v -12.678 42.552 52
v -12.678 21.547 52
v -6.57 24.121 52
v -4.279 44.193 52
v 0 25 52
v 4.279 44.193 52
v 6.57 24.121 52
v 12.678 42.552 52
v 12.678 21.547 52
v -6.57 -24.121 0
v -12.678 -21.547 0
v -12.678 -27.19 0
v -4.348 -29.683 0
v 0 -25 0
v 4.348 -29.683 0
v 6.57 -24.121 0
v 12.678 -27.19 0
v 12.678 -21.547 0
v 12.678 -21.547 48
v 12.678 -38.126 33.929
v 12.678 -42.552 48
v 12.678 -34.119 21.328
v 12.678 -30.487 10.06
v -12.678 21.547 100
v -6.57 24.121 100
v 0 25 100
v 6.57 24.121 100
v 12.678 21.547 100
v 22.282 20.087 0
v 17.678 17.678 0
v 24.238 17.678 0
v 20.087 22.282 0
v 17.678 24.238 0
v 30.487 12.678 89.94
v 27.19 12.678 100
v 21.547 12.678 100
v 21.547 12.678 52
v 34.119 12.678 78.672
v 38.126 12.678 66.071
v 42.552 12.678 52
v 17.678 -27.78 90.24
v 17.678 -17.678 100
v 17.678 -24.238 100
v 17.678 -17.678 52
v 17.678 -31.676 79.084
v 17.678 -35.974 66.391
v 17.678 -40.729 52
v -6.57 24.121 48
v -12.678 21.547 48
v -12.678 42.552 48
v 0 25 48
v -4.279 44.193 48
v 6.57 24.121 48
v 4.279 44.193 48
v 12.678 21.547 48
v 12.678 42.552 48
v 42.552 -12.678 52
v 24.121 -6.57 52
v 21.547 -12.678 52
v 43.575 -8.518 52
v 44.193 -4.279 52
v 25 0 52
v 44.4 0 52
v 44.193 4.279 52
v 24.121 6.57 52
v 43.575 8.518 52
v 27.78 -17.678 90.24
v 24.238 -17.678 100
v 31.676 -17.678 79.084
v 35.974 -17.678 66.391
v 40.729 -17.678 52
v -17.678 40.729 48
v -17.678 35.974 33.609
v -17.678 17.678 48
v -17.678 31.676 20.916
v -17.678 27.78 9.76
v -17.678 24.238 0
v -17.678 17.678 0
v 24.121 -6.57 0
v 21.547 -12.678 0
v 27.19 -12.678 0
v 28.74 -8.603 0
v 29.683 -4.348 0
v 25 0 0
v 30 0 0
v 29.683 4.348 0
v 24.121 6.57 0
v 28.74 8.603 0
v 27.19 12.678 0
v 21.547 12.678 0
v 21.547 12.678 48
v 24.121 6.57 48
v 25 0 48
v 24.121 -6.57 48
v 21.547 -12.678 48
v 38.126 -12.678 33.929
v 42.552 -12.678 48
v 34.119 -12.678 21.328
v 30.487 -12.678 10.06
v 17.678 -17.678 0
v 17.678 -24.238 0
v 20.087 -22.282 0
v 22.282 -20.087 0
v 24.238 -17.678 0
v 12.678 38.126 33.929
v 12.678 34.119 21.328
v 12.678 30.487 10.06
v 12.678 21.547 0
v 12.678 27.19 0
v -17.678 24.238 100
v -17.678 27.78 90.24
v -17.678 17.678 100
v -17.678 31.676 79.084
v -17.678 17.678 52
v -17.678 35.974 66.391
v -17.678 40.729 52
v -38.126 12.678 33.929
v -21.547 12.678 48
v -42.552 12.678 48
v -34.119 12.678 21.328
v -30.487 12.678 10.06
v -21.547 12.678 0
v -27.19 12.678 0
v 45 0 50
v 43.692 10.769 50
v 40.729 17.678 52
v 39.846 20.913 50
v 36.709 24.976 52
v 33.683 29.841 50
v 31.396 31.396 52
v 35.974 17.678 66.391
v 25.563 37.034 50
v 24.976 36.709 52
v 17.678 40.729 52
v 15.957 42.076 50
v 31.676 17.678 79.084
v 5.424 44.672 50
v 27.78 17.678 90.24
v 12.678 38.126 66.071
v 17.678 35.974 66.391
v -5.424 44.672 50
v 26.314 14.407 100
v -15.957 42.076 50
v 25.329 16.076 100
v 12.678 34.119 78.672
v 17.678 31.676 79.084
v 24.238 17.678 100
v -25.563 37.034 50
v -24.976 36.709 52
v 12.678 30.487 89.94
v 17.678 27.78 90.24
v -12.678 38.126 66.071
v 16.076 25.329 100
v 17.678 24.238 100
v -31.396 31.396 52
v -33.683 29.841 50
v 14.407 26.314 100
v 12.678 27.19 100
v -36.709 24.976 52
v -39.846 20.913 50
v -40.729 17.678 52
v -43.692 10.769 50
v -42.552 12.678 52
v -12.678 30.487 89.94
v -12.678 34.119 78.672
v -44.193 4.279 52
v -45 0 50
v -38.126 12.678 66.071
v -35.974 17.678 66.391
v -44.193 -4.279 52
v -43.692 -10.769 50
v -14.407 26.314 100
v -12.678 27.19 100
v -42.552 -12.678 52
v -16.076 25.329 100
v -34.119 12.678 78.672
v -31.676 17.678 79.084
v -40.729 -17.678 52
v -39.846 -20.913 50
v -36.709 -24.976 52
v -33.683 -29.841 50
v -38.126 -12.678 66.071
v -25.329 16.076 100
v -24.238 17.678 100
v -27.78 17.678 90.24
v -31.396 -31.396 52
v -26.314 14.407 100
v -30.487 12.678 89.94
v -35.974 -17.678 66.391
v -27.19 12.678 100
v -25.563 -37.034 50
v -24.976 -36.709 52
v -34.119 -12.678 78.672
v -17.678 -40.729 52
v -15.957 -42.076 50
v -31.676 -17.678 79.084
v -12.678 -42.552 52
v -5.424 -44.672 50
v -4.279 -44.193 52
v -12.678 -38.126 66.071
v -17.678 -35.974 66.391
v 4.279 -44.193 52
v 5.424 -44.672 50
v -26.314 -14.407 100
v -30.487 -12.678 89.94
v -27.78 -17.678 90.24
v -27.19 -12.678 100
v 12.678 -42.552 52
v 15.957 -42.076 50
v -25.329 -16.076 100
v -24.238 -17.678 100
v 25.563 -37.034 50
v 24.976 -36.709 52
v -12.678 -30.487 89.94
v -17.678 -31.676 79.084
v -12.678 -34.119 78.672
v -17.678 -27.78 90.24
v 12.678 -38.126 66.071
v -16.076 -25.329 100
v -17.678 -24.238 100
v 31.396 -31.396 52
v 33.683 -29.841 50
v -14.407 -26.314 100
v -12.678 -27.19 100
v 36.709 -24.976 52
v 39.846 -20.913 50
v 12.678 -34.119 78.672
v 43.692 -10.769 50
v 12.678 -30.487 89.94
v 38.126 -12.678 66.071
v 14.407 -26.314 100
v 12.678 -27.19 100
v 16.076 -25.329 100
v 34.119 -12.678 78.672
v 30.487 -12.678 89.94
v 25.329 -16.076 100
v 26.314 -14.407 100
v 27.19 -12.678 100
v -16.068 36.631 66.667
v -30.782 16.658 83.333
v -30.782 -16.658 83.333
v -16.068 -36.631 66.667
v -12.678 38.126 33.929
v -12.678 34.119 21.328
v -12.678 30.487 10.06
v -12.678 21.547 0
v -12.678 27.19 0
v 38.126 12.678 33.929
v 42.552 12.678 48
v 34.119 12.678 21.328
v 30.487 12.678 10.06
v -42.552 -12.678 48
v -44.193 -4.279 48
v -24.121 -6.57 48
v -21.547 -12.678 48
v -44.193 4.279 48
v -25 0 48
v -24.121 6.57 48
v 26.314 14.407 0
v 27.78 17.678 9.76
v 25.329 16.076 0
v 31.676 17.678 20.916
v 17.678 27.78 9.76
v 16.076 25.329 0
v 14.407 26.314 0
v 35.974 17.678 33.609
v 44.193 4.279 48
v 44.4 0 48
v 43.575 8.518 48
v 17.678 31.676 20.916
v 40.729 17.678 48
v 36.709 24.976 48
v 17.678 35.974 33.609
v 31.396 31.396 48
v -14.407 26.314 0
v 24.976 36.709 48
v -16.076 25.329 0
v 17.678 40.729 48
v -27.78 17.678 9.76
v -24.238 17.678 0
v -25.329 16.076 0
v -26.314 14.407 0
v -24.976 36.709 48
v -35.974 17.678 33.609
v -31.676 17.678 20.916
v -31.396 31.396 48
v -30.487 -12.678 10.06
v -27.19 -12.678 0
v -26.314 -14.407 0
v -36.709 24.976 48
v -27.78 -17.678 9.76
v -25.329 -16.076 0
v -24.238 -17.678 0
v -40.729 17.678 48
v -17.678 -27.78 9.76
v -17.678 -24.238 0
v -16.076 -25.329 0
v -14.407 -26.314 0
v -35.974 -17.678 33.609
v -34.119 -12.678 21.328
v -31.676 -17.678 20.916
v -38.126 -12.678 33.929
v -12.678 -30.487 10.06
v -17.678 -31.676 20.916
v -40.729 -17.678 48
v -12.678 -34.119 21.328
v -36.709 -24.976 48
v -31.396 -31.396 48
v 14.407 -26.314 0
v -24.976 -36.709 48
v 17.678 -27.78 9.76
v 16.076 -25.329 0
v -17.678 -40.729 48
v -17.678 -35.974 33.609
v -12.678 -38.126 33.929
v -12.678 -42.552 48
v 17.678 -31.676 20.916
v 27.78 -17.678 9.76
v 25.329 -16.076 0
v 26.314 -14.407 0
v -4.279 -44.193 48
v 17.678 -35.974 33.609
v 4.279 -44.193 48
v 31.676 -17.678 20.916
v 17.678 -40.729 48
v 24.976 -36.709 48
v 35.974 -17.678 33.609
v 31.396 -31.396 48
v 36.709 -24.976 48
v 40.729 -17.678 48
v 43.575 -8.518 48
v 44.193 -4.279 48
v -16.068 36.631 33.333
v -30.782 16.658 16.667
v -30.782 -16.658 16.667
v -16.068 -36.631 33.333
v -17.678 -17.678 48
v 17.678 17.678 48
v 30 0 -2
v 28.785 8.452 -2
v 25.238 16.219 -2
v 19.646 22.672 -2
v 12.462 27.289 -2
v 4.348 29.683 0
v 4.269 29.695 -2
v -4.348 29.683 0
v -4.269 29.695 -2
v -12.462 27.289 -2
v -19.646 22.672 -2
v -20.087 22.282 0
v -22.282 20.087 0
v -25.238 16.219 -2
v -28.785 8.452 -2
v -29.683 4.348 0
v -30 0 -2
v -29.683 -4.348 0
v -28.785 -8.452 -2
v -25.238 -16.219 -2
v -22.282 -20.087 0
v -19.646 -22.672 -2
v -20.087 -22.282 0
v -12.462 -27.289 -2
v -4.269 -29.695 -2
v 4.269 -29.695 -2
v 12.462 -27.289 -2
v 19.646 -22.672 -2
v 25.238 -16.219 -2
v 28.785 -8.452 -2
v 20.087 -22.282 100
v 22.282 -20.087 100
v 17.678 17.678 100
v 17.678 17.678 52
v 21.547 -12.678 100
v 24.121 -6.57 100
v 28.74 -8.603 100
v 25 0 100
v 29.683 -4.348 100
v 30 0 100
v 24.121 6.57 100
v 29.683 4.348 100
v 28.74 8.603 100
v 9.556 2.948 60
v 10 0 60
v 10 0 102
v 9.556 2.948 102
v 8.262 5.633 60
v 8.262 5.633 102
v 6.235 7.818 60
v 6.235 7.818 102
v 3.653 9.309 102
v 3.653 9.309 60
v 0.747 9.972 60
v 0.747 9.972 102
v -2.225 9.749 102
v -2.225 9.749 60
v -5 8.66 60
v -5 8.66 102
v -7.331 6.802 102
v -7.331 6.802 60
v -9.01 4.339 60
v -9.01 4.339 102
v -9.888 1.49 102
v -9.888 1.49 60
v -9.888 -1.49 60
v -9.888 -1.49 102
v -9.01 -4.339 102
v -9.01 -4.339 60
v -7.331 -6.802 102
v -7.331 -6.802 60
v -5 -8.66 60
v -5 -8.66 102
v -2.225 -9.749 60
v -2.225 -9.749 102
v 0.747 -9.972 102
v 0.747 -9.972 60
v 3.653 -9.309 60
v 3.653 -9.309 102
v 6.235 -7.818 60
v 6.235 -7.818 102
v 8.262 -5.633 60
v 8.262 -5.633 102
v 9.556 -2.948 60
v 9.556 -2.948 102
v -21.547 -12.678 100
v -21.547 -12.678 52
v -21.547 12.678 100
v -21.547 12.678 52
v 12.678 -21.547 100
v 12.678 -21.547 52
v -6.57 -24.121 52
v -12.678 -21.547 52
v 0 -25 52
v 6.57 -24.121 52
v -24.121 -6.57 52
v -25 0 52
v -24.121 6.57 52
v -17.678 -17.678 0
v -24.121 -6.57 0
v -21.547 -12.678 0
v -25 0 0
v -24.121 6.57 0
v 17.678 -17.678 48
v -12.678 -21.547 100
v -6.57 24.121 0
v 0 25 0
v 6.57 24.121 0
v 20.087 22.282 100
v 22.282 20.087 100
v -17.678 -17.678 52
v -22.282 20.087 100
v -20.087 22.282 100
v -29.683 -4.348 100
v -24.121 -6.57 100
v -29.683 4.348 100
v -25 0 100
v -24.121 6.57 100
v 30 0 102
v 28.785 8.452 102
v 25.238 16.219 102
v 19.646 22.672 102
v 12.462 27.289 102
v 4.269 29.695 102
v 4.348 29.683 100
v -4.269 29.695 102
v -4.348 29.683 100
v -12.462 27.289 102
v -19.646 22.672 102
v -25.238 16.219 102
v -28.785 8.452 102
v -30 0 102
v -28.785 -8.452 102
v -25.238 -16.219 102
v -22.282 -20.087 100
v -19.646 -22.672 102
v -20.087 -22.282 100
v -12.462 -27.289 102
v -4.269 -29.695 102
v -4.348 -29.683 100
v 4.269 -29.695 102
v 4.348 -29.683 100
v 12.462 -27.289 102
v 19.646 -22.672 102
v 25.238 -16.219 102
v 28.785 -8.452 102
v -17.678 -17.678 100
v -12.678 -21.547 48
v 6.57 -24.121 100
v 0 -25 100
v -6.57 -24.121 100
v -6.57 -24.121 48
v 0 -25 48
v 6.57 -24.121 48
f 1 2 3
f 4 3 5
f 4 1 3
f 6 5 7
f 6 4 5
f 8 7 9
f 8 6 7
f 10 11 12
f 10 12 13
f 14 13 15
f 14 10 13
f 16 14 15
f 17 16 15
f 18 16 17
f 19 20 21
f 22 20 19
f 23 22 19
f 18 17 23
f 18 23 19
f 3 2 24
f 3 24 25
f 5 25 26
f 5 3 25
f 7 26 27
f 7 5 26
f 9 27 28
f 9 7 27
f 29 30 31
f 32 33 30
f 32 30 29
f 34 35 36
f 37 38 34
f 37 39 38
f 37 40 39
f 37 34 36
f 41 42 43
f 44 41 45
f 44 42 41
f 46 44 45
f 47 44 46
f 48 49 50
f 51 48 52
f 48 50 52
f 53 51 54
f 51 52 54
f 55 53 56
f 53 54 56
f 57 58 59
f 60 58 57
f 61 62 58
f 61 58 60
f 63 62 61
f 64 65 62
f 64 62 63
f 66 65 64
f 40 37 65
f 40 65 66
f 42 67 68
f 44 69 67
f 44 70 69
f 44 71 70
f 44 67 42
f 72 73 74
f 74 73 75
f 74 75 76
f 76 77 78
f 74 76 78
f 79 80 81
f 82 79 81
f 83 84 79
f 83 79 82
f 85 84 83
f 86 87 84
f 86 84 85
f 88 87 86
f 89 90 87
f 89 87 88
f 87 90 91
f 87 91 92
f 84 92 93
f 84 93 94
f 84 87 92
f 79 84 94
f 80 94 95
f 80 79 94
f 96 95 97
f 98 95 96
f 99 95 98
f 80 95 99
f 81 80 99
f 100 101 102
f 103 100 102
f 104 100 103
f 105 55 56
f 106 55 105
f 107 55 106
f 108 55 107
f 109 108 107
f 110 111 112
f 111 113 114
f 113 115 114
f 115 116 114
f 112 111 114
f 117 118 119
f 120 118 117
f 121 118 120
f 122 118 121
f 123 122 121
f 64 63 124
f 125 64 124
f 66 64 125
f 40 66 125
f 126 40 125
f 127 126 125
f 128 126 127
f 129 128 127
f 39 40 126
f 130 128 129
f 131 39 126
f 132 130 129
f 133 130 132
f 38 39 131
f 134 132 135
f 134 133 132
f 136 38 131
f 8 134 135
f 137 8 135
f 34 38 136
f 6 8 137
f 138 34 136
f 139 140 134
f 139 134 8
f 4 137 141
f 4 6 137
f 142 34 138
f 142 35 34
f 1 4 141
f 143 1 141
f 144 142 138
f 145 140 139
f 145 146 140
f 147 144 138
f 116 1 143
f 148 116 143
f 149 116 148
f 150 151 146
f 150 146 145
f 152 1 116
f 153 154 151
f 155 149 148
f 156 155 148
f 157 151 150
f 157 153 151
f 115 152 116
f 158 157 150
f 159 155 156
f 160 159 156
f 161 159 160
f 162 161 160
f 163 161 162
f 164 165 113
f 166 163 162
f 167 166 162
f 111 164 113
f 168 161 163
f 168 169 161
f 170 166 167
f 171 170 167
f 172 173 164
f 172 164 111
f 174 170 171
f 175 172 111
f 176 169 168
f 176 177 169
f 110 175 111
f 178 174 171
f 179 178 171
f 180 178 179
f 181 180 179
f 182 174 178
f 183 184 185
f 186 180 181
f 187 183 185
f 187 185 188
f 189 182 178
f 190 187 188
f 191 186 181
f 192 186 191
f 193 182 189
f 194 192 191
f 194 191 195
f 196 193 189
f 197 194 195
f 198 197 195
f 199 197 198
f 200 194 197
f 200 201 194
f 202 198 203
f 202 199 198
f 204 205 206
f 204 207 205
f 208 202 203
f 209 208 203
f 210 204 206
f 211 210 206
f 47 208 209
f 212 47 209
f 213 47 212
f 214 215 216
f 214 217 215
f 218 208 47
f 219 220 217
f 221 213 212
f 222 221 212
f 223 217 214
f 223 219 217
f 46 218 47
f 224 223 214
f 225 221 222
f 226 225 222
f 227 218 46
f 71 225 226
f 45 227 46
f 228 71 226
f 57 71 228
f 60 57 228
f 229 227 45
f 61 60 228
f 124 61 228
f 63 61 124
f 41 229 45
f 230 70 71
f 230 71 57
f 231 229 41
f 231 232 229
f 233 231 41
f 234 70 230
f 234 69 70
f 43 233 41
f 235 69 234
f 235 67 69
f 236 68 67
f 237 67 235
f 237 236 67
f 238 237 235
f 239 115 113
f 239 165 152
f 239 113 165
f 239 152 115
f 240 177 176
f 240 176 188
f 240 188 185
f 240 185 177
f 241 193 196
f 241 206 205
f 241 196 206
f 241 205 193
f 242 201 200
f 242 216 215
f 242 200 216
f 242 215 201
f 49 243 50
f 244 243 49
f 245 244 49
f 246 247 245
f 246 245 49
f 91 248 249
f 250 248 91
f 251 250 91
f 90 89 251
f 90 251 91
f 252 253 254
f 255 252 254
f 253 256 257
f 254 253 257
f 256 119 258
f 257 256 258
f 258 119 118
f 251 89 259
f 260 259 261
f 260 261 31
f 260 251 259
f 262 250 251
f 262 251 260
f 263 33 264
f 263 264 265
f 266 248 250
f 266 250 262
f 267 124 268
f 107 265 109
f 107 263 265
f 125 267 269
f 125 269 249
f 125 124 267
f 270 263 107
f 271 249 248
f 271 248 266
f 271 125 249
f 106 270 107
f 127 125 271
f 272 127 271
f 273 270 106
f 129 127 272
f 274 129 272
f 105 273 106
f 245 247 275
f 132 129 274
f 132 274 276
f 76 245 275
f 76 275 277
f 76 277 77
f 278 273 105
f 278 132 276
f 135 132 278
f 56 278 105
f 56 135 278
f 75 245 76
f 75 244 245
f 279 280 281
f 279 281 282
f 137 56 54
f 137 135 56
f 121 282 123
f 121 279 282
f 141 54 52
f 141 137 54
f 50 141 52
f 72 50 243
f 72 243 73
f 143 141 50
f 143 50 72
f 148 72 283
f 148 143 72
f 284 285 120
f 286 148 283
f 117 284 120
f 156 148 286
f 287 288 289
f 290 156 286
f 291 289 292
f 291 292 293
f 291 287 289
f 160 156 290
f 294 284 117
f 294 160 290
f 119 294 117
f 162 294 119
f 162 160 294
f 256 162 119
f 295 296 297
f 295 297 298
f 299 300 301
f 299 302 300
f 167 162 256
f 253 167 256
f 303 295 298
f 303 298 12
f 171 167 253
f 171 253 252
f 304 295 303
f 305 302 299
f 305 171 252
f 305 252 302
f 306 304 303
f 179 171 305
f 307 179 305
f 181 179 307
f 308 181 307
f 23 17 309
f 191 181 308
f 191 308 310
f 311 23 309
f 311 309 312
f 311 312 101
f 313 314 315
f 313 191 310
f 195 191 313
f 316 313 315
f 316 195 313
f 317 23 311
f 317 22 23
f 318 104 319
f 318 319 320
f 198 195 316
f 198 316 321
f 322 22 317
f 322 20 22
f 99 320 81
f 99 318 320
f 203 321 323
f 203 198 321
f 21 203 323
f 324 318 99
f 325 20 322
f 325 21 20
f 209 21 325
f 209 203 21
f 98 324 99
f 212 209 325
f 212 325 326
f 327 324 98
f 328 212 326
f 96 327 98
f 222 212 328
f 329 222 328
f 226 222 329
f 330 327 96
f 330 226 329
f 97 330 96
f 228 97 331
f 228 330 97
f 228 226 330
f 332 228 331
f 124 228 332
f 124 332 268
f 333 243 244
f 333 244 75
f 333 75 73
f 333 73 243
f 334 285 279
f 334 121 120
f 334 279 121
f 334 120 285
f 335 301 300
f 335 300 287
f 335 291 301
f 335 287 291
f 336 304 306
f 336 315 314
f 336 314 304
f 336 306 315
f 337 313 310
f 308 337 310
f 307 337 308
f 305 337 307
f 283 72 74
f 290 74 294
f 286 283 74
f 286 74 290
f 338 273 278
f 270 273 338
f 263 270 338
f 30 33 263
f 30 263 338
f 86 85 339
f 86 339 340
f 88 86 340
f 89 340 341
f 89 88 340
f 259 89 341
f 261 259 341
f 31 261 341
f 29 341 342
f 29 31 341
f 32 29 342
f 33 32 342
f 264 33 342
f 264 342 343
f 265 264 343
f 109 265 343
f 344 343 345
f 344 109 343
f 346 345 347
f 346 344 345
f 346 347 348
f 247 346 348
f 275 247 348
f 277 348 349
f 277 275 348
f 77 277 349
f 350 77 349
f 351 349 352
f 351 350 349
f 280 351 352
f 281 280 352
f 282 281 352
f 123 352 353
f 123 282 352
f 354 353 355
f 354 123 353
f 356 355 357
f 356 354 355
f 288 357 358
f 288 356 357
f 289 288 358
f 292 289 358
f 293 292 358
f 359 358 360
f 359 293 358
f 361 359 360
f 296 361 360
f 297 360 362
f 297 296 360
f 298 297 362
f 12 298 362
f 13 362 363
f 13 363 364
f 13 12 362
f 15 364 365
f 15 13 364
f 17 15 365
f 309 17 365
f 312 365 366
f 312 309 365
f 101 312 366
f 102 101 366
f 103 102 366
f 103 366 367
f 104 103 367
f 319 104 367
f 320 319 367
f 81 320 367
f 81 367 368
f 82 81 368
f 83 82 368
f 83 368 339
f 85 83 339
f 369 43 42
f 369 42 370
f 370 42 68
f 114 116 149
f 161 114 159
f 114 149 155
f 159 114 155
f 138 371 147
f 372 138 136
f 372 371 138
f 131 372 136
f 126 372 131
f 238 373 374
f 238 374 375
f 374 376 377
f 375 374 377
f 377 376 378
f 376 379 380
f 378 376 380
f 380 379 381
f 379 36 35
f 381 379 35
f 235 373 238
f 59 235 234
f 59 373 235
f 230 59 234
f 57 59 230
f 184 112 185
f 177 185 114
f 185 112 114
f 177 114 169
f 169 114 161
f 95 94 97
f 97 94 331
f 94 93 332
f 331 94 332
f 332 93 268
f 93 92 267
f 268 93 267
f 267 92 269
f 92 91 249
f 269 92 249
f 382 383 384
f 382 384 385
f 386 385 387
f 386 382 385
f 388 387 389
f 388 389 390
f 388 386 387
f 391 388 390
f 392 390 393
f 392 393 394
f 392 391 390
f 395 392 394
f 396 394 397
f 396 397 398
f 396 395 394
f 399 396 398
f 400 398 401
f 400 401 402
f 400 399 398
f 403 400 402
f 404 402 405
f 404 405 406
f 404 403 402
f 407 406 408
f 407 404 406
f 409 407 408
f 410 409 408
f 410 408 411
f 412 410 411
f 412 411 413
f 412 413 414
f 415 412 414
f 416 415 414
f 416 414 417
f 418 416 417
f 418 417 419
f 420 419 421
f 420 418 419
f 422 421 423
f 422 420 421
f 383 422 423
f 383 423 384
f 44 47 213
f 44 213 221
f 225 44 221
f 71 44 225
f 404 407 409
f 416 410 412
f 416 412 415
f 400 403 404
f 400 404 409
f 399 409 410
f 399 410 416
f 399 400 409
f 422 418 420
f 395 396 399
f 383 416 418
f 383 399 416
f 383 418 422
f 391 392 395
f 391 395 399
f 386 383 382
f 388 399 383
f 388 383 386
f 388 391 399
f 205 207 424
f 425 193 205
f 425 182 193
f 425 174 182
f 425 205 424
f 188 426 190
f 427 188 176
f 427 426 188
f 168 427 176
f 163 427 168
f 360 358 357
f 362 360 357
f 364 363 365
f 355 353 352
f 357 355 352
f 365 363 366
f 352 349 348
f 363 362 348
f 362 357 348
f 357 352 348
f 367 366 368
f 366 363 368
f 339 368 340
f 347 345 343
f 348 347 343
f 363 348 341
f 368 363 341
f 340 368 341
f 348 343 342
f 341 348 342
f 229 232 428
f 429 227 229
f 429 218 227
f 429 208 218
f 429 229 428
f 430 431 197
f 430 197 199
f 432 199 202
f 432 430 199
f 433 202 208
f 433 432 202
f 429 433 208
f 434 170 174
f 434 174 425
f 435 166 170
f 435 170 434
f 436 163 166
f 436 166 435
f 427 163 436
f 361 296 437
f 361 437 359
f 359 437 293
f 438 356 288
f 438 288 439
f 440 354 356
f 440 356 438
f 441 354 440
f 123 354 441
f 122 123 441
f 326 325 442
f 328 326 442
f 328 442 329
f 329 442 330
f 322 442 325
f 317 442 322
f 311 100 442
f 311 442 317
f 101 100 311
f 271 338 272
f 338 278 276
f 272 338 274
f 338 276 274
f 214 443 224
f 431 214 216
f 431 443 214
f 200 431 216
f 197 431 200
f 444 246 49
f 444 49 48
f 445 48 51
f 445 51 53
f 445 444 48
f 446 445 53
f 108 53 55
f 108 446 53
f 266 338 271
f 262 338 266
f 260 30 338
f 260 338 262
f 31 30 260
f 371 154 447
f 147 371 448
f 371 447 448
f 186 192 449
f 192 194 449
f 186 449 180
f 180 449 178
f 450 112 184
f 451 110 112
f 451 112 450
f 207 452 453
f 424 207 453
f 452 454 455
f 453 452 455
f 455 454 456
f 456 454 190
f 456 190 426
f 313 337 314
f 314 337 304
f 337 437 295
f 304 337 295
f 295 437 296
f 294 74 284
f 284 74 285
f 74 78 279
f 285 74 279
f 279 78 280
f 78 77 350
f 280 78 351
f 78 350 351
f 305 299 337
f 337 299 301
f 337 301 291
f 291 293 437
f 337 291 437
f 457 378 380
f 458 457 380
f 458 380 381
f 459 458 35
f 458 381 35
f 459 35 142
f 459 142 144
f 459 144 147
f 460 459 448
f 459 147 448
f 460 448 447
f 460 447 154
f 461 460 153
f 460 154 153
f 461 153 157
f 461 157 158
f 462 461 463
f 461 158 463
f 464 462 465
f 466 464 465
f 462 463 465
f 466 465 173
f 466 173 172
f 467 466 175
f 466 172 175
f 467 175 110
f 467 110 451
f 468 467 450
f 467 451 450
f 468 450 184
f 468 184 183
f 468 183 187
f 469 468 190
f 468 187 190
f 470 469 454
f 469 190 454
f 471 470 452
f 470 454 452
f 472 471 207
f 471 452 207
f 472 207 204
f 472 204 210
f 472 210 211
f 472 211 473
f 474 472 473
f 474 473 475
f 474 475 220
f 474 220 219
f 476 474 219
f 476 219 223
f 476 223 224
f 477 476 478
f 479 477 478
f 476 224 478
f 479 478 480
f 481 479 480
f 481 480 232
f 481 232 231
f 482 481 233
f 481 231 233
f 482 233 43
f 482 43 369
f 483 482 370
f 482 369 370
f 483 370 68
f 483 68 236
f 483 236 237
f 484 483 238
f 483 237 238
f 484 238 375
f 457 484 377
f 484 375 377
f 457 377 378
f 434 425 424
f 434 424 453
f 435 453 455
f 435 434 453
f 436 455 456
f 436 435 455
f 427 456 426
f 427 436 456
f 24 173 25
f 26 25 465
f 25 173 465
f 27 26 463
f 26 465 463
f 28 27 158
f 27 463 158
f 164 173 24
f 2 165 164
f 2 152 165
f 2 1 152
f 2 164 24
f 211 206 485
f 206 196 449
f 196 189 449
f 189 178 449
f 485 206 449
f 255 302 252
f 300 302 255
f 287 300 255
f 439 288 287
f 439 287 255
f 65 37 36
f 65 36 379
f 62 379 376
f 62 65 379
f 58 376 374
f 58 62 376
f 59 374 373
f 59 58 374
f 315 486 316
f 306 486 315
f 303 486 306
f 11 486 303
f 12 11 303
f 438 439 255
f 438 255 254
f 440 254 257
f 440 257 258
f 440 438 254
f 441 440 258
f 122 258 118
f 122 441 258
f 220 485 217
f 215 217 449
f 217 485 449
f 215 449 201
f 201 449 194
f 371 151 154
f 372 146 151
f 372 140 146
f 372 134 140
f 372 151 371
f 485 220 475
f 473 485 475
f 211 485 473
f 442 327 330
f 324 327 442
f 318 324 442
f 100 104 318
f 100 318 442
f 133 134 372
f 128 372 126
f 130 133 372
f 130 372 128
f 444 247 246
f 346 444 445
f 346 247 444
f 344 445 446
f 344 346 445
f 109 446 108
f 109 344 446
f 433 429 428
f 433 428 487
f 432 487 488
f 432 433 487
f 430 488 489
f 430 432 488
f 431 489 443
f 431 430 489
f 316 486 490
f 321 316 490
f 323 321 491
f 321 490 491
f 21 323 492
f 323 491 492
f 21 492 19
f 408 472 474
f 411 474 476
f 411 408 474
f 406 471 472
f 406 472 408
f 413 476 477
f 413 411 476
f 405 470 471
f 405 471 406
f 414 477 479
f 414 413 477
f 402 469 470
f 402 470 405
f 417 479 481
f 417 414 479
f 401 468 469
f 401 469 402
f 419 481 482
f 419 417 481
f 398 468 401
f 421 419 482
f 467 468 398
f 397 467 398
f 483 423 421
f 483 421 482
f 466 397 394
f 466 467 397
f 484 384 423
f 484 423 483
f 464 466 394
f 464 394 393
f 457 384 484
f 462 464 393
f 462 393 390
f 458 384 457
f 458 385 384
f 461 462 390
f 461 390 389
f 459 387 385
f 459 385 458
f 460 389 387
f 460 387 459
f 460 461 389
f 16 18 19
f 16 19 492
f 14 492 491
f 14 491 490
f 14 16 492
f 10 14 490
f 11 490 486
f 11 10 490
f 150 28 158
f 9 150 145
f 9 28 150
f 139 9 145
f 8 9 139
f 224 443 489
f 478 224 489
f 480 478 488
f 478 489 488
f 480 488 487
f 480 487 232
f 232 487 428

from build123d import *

# Parameters (mm, degrees)
FRONT_CONNECTOR_SKETCH_R      = 30
FRONT_CONNECTOR_EXTRUDE_DEPTH = 2
BACK_CONNECTOR_SKETCH_R       = 30
BACK_CONNECTOR_EXTRUDE_DEPTH  = 2
MID_RING_SKETCH_R             = 45
BACK_START                    = 2
BACK_CROSS_CUT_DEPTH          = 48.000004
FRONT_START                   = -50.000001
FRONT_CROSS_CUT_DEPTH         = 48.000002
PIN_HOLE_CUT_DEPTH            = 2
PIN_HOLE_CUT_DEPTH_BACK       = 40
PIN_HOLE_SKETCH_R             = 10


with BuildPart() as part:
    # Front Connector Sketch → Front Connector Extrude (new body)
    with BuildSketch(Plane.XY):
        Circle(FRONT_CONNECTOR_SKETCH_R)
    extrude(amount=-FRONT_CONNECTOR_EXTRUDE_DEPTH)

    # Mid Ring Sketch → section 1 of front_loft
    with BuildSketch(Plane.XY.offset(50), mode=Mode.PRIVATE) as front_loft_s1:
        Circle(MID_RING_SKETCH_R)
    # loft from a face of the part (front_loft)
    loft([part.faces().sort_by_distance((0, 0, 0))[0], front_loft_s1.sketch])



with BuildPart() as body_2:
    # Back Connector Sketch → Back Connector Extrude (new body)
    with BuildSketch(Plane.XY.offset(100)):
        Circle(BACK_CONNECTOR_SKETCH_R)
    extrude(amount=BACK_CONNECTOR_EXTRUDE_DEPTH)


with BuildPart() as part_1:
    add(part.part)

    add(body_2.part)  # back_loft joins it to this body
    # loft up to a face of the part (back_loft)
    loft([Face(Wire([part_1.edges().sort_by_distance((-30.804619767, 32.803588234, 50))[0]])), part_1.faces().sort_by_distance((0, 0, 100))[0]])

    # Cross Cut Sketch → Back Cross Cut (cut)
    with BuildSketch(Plane.XY.offset(50).offset(BACK_START)):
        with BuildLine():
            Line((-12.67766953, 43.177270586), (-12.67766953, 21.5470809))
            ThreePointArc((-12.67766953, 21.5470809), (0, 25), (12.67766953, 21.5470809))
            Line((12.67766953, 21.5470809), (12.67766953, 43.177270586))
            ThreePointArc((12.67766953, 43.177270586), (0, 45), (-12.67766953, 43.177270586))
        make_face()
        with BuildLine():
            Line((-12.67766953, -21.5470809), (-12.67766953, -43.177270586))
            ThreePointArc((-12.67766953, -43.177270586), (0, -45), (12.67766953, -43.177270586))
            Line((12.67766953, -43.177270586), (12.67766953, -21.5470809))
            ThreePointArc((12.67766953, -21.5470809), (0, -25), (-12.67766953, -21.5470809))
        make_face()
        with BuildLine():
            Line((17.67766953, 41.382363393), (17.67766953, 17.67766953))
            Line((17.67766953, 17.67766953), (41.382363393, 17.67766953))
            ThreePointArc((41.382363393, 17.67766953), (31.819805153, 31.819805153), (17.67766953, 41.382363393))
        make_face()
        with BuildLine():
            Line((17.67766953, -17.67766953), (17.67766953, -41.382363393))
            ThreePointArc((17.67766953, -41.382363393), (31.819805153, -31.819805153), (41.382363393, -17.67766953))
            Line((41.382363393, -17.67766953), (17.67766953, -17.67766953))
        make_face()
        with BuildLine():
            Line((-17.67766953, 41.382363393), (-17.67766953, 17.67766953))
            Line((-17.67766953, 17.67766953), (-41.382363393, 17.67766953))
            ThreePointArc((-41.382363393, 17.67766953), (-31.819805153, 31.819805153), (-17.67766953, 41.382363393))
        make_face()
        with BuildLine():
            Line((-17.67766953, -17.67766953), (-17.67766953, -41.382363393))
            ThreePointArc((-17.67766953, -41.382363393), (-31.819805153, -31.819805153), (-41.382363393, -17.67766953))
            Line((-41.382363393, -17.67766953), (-17.67766953, -17.67766953))
        make_face()
        with BuildLine():
            Line((43.177270586, 12.67766953), (21.5470809, 12.67766953))
            ThreePointArc((21.5470809, 12.67766953), (25, 0), (21.5470809, -12.67766953))
            Line((21.5470809, -12.67766953), (43.177270586, -12.67766953))
            ThreePointArc((43.177270586, -12.67766953), (45, 0), (43.177270586, 12.67766953))
        make_face()
        with BuildLine():
            Line((-21.5470809, 12.67766953), (-43.177270586, 12.67766953))
            ThreePointArc((-43.177270586, 12.67766953), (-45, 0), (-43.177270586, -12.67766953))
            Line((-43.177270586, -12.67766953), (-21.5470809, -12.67766953))
            ThreePointArc((-21.5470809, -12.67766953), (-25, 0), (-21.5470809, 12.67766953))
        make_face()
    extrude(amount=BACK_CROSS_CUT_DEPTH, mode=Mode.SUBTRACT)

    # Cross Cut Sketch<2> → Front Cross Cut (cut)
    with BuildSketch(Plane.XY.offset(50).offset(FRONT_START)):
        with BuildLine():
            Line((-12.67766953, 43.177270586), (-12.67766953, 21.5470809))
            ThreePointArc((-12.67766953, 21.5470809), (0, 25), (12.67766953, 21.5470809))
            Line((12.67766953, 21.5470809), (12.67766953, 43.177270586))
            ThreePointArc((12.67766953, 43.177270586), (0, 45), (-12.67766953, 43.177270586))
        make_face()
        with BuildLine():
            Line((-12.67766953, -21.5470809), (-12.67766953, -43.177270586))
            ThreePointArc((-12.67766953, -43.177270586), (0, -45), (12.67766953, -43.177270586))
            Line((12.67766953, -43.177270586), (12.67766953, -21.5470809))
            ThreePointArc((12.67766953, -21.5470809), (0, -25), (-12.67766953, -21.5470809))
        make_face()
        with BuildLine():
            Line((17.67766953, 41.382363393), (17.67766953, 17.67766953))
            Line((17.67766953, 17.67766953), (41.382363393, 17.67766953))
            ThreePointArc((41.382363393, 17.67766953), (31.819805153, 31.819805153), (17.67766953, 41.382363393))
        make_face()
        with BuildLine():
            Line((17.67766953, -17.67766953), (17.67766953, -41.382363393))
            ThreePointArc((17.67766953, -41.382363393), (31.819805153, -31.819805153), (41.382363393, -17.67766953))
            Line((41.382363393, -17.67766953), (17.67766953, -17.67766953))
        make_face()
        with BuildLine():
            Line((-17.67766953, 41.382363393), (-17.67766953, 17.67766953))
            Line((-17.67766953, 17.67766953), (-41.382363393, 17.67766953))
            ThreePointArc((-41.382363393, 17.67766953), (-31.819805153, 31.819805153), (-17.67766953, 41.382363393))
        make_face()
        with BuildLine():
            Line((-17.67766953, -17.67766953), (-17.67766953, -41.382363393))
            ThreePointArc((-17.67766953, -41.382363393), (-31.819805153, -31.819805153), (-41.382363393, -17.67766953))
            Line((-41.382363393, -17.67766953), (-17.67766953, -17.67766953))
        make_face()
        with BuildLine():
            Line((43.177270586, 12.67766953), (21.5470809, 12.67766953))
            ThreePointArc((21.5470809, 12.67766953), (25, 0), (21.5470809, -12.67766953))
            Line((21.5470809, -12.67766953), (43.177270586, -12.67766953))
            ThreePointArc((43.177270586, -12.67766953), (45, 0), (43.177270586, 12.67766953))
        make_face()
        with BuildLine():
            Line((-21.5470809, 12.67766953), (-43.177270586, 12.67766953))
            ThreePointArc((-43.177270586, 12.67766953), (-45, 0), (-43.177270586, -12.67766953))
            Line((-43.177270586, -12.67766953), (-21.5470809, -12.67766953))
            ThreePointArc((-21.5470809, -12.67766953), (-25, 0), (-21.5470809, 12.67766953))
        make_face()
    extrude(amount=FRONT_CROSS_CUT_DEPTH, mode=Mode.SUBTRACT)

    # Pin Hole Sketch → Pin Hole Cut (cut, two sides: drawn at the far end of the back side and taken through both)
    with BuildSketch(Plane.XY.offset(100).offset(-PIN_HOLE_CUT_DEPTH_BACK)):
        Circle(PIN_HOLE_SKETCH_R)
    extrude(amount=PIN_HOLE_CUT_DEPTH + PIN_HOLE_CUT_DEPTH_BACK, mode=Mode.SUBTRACT)


solid = part_1.part
